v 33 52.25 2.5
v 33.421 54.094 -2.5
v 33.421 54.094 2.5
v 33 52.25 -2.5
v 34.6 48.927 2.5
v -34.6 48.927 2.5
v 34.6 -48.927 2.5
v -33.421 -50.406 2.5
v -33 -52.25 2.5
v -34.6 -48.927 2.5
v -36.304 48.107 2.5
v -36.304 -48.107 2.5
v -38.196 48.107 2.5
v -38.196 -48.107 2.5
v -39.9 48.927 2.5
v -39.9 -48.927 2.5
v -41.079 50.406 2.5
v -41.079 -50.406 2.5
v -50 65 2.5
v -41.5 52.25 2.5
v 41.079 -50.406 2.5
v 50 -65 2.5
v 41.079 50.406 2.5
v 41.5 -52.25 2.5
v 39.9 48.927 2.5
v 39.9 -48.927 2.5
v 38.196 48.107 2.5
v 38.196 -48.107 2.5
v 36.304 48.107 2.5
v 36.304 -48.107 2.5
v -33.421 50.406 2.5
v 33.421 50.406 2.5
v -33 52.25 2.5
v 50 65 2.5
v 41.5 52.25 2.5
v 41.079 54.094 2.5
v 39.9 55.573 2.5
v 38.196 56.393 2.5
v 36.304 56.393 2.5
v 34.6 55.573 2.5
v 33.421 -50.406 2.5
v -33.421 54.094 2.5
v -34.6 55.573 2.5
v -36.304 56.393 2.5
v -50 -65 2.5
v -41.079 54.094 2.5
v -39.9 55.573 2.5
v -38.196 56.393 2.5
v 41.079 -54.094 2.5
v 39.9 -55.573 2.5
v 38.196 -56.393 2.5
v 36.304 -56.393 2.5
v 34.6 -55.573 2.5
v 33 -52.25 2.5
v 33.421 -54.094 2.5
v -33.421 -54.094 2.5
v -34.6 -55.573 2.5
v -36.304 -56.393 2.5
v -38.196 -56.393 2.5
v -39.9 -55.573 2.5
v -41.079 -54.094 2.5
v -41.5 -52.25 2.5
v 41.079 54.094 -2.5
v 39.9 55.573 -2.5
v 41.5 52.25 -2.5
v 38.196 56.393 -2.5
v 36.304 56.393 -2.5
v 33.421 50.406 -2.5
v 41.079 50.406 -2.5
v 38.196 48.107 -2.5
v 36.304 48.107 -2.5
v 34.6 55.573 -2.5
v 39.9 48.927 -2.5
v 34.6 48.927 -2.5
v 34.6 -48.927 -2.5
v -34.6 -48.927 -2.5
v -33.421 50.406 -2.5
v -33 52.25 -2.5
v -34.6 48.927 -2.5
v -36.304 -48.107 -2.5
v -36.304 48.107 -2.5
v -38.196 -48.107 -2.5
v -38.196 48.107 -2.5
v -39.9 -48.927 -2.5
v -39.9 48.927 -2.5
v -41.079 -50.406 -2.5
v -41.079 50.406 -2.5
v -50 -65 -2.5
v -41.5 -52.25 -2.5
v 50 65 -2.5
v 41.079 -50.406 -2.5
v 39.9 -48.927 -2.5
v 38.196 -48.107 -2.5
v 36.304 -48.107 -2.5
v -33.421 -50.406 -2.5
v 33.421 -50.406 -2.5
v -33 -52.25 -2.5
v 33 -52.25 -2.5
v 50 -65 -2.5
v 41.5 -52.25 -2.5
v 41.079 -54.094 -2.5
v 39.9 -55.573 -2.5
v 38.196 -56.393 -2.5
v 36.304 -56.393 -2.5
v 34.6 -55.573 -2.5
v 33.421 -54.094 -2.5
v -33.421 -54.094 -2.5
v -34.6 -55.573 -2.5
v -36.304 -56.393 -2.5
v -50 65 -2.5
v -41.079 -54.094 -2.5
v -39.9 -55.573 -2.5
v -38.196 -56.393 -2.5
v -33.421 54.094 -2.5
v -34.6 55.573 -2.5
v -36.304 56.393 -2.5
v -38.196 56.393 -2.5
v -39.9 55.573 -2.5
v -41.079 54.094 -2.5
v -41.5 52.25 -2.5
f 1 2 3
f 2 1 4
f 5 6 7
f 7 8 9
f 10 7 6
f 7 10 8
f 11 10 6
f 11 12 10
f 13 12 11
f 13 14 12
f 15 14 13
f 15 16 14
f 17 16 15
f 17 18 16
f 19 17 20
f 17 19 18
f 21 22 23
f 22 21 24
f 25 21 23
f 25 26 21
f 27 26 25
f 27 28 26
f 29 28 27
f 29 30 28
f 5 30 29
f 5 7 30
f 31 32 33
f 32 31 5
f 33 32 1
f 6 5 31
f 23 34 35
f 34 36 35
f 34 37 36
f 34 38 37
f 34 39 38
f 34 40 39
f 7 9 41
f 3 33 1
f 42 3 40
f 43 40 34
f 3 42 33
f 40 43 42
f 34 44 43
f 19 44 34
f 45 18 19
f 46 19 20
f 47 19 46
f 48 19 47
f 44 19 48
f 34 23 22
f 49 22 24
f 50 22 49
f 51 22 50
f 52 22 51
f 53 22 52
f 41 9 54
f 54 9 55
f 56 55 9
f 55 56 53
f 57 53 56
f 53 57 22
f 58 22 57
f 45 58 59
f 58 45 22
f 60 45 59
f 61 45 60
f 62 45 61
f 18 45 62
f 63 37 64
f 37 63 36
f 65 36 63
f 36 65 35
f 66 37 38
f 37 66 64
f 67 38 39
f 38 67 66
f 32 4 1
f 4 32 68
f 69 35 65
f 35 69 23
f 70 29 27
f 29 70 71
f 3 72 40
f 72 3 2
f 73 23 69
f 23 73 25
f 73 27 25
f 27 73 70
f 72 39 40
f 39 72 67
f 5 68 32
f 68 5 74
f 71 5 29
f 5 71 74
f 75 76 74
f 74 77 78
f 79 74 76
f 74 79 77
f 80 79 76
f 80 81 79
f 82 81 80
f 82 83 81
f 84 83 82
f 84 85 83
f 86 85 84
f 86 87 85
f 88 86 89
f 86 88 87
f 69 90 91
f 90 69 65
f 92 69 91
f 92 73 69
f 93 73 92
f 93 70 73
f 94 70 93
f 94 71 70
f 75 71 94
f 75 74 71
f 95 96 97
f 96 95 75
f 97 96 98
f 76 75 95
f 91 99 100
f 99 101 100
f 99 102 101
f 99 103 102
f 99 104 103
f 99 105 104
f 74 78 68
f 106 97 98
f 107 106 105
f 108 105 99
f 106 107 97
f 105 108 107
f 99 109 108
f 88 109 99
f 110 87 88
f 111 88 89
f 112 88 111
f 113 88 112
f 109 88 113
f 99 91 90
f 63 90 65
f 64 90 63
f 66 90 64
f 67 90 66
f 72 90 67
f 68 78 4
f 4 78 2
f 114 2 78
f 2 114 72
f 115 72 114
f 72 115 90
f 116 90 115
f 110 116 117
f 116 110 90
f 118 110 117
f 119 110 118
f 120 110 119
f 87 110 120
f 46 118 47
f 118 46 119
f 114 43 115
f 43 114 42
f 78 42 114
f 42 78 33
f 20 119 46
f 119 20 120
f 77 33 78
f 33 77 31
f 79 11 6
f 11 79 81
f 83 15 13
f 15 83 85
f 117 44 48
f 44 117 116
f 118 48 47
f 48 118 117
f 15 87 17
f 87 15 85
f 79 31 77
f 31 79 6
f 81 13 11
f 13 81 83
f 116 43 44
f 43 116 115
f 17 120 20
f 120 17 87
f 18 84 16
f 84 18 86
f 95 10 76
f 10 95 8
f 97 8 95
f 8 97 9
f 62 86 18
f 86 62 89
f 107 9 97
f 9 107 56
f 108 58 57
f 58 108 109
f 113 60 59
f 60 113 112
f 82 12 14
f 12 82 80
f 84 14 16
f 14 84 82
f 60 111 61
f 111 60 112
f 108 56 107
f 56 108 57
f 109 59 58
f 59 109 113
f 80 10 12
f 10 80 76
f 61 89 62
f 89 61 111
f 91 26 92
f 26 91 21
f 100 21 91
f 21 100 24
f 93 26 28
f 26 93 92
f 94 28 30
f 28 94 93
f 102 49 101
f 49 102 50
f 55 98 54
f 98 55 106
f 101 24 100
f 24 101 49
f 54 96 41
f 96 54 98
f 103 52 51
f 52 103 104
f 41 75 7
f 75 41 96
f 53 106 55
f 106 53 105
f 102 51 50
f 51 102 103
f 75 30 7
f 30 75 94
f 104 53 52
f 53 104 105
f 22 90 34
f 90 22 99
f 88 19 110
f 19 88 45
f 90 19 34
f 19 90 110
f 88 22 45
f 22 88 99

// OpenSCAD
// Generated by SolidPython 1.1.3 on 2023-10-18 16:19:57


difference() {
	cube(center = true, size = [100, 130.0000000000, 5]);
	union() {
		translate(v = [37.2500000000, 52.2500000000]) {
			cylinder(center = true, h = 5, r = 4.2500000000);
		}
		translate(v = [-37.2500000000, 52.2500000000]) {
			cylinder(center = true, h = 5, r = 4.2500000000);
		}
		translate(v = [-37.2500000000, -52.2500000000]) {
			cylinder(center = true, h = 5, r = 4.2500000000);
		}
		translate(v = [37.2500000000, -52.2500000000]) {
			cylinder(center = true, h = 5, r = 4.2500000000);
		}
	}
}
/***********************************************
*********      SolidPython code:      **********
************************************************
 
import solid
import numbers
import pudb
from solid.utils import *
import viewscad
import subprocess
import os
import os.path as osp
import math
import sys

chamfer_extrude=solid.import_scad("./chamfer_extrude.scad")
chamfer_extrude=chamfer_extrude.chamfer_extrude
r = viewscad.Renderer(width=800, height=800)

def debug(model,f_name,path="/home/ts/code/projects/mfd/designs/debug"):
    solid.scad_render_to_file(model,osp.join(path,f_name)+".scad")
#generate position list of wells using offset from center
wells_pos_from_center_4 = lambda offset: [[-offset,offset],
                                        [offset, offset],
                                        [-offset, -offset],
                                        [offset, -offset]]
#wells_pos_from_center_2 = lambda offset: [[0,offset],
#                                        [0, -offset]]
wells_pos_from_center_2 = lambda offset: [[offset,0],
                                        [-offset,0]]

def make_well(dims,shape=None,height=None,dxf=False):
    def circle_cylinder():
        if dxf or (height is None):
            well = solid.circle(r=dims, segments=64)
        else:
            well = solid.cylinder(r=dims, h=height, segments=64, center = True)
        return well
    if dims is None:
        sys.exit("radius needs to be a number")
    if isinstance(dims, numbers.Number):
        well =circle_cylinder()
    elif len(dims)==1:
        if isinstance(dims[1], numbers.Number):
            well =circle_cylinder()
        else:
            sys.exit("radius needs to be a number")
    elif len(dims)==2:
        well = solid.square(dims,center = True)
    elif len(dims)==3:
        well = solid.cube(dims, center = True)
    return well

def wells_top_bottom(center_gap,device_dims=None,shape=None,height=None, positions = None, dxf = False,well_shape=None):
    if well_shape == None:
        well_shape = make_well(device_dims,shape=shape,height=height,dxf=dxf)
    wells = []
    if positions is None:
        offset = radius+radius/2.0
        positions = wells_pos_from_center_2(offset)
    if dxf or (height is None):
        height = 0
    for position in positions:
        if dxf:
            wells.append(solid.translate([position[0],position[1]])(well_shape))
        else:
            wells.append(solid.translate([position[0],position[1],height/2.0])(well_shape))
    return  union()(*wells)

#place wells in four corners 
def four_corner(radius,height=None, positions = None, dxf = False):
    #if well pos not specified set
    #to equally spaced by half radius
    if positions is None:
        offset = radius+radius/2.0
        positions = wells_pos_from_center_4(offset)
    if dxf or (height is None):
        height = 0
    #make wells at positions with specified radius and height
    wells = []
    for position in positions:
        #make circle if making dxf
        if dxf:
            well_shape = solid.circle(r=radius, segments=64)
            well_shape = solid.translate([position[0],position[1]])(well_shape)
        #if stl make cylinder
        else:
            well_shape = solid.cylinder(r=radius, h=height, segments=64, center = True)
            well_shape = solid.translate([position[0],position[1],height/2.0])(well_shape)
        wells.append(well_shape)
    return  union()(*wells)

#generate channels 
def make_channels(length,width,height=0,num_chans=1,max_chans=None,spacing=None, dxf = False,
                  rotate_channels=False):
    if dxf or (height is None):
        height = 0
    #if channel gap not defined, is equal to
    if spacing is None: spacing = width
    #calculate number of channels if fitting max num within given width
    if not max_chans is None:
        import math
        num_chans = math.floor((max_chans-spacing)/(width+spacing))
    #get total width of channel section  
    total_width = (width*num_chans)+(spacing*(num_chans-1))

    #make template channel
    #if rotate_channels: width, length = length, width
    if dxf:
        channel_t = solid.square([length,width],center = True)
    else:
        channel_t = solid.cube([length,width,height], center = True)

    #if number channels is even, offset the first channel to center its gap
    if num_chans % 2 == 0: centering = -(width/2.0+spacing/2.0)
    else: centering = 0
    #move template channel up to align bottom at z = 0 
    #and offset center if necessary
    if dxf:
        channel_t = solid.translate([0,centering])(channel_t)
    else:
        channel_t = solid.translate([0,centering,height/2.0])(channel_t)

    #if rotate_channels: length,width = width,length
    #start making the channels
    channels = []
    for i in range(num_chans):
        #if i=0 there is no translation
        #if i=1, we make the first channel adjacent to second
        direction = i

        #if i>=1, we add channels alternating left and right
        if i >= 1:
            direction = -(i/2.0)
            if i % 2 == 1: direction = (-direction)+0.5
                
        #make channel at right position and add it to channel list
        translation_coords = [0,direction*(width+spacing)]
        #if rotate_channels: translation_coords = [direction*(width+spacing),0]
        if dxf:
            channel = solid.translate(translation_coords)(channel_t)
        else:
            channel = solid.translate([*translation_coords,0])(channel_t)
        channels.append(channel)
    
    #group all channels as one object
    channels = union()(*channels)
    #compute the x,y,z dimensions in order to pass as arguments 
    #for construction of other parts of device (such as the chambers)
    measurements = {'x':(length/2.0,-length/2.0),
                    'y':(total_width/2.0,-total_width/2.0)}
    if not dxf:
        measurements['z'] = (height,0)
    if rotate_channels:
        channels = solid.rotate(90)(channels)
        measurements['x'],measurements['y']=measurements['y'],measurements['x']
    return channels,measurements

def make_chambers(msrs,height=None,extra=0,len_until=None,width=None, dxf = False):
    #computes x,y,z length
    total = lambda x : abs(x[0]) + abs(x[1])
    
    #if specific height if specified
    #otherwise use same height as channels
    if dxf:
        pass
    elif not height is None:
        msrs['z'] = (height,0)
    else:
        msrs['z'] = (0,0)
        
    #make copy of measurements from channels to modify chamber dimensions 
    #and add length to chambers as specified
    chamber_dims = msrs.copy()
    #calculate length of chamber to reach specified offset
    if not len_until is None:
        chamber_len = len_until-(msrs['x'][0])
    #or add specified length to channel length (if not specified, adds 0)
    else:
        chamber_len = msrs['x'][0]+extra
    #set the chamber length based 
    chamber_dims['x'] = (chamber_len/2.0,-(chamber_len/2.0))
    #compute final dimensions of chamber
    if not width is None:
        chamber_dims['y'] = (width/2.0,-width/2.0)
    chamber_dims = [total(size) for size in chamber_dims.values()]
        
    #calculate chamber translation offset to place adjacent to channels
    chamber_trslt = msrs['x'][0]+(chamber_len/2.0)
    #compute chamber translation coordinates to align with channels
    #x = 1 moves chamber above channels
    #x = -1 moves chamber below channels
    if dxf:
        trslt = lambda x : [x*(chamber_trslt),0]
    else:
        trslt = lambda x : [x*(chamber_trslt),0,msrs['z'][0]/2.0]
    
    #function to make chamber at top or at bottom 
    if dxf:
        move = lambda x : solid.translate(trslt(x))(solid.square(chamber_dims, center = True) )
    else:
        move = lambda x : solid.translate(trslt(x))(solid.cube(chamber_dims,center = True))
    #make top and bottom chambers and return them as grouped
    top = move(1)
    bottom = move(-1)
    #chambers=solid.rotate(90)(solid.union()(top,bottom))
    chambers=(solid.union()(top,bottom))

    return chambers

#create alignment features 
def alignment_features(unit,dims,grid_size, mask_size = None, alignment = "hollow", units_from_center = (2.5,2.5), corner_len=None):
    width = grid_size[0]*dims[0]
    length = grid_size[1]*dims[1]
    if mask_size is None and corner_len is None:
        corner_len = (dims[0] + dims[1]) /2 / 8
    corner = lambda thickness_div : solid.union()( solid.square([corner_len,corner_len/thickness_div],center=False), solid.square([corner_len/thickness_div,corner_len],center=False) )
    
    def make_full(thickness_div):
        thickness = corner_len/thickness_div
        tr = solid.translate([0, 0, 0 ])(solid.rotate(180)(corner(thickness_div)))
        tr = solid.translate([thickness/2,thickness/2,0])(tr)
        bl = solid.translate([0, 0, 0 ])(solid.rotate(0)(corner(thickness_div)))
        bl = solid.translate([-thickness/2,-thickness/2,0])(bl)
        return solid.union()(tr,bl)
    
    def make_hollow(thickness_div):
        thickness = corner_len/(thickness_div/2)
        inner = make_full(thickness_div)
        outer = make_full(thickness_div/2)
        hollow = outer - inner 
        return hollow
    
    center = (width /2 , length/2)
    mask_pos = lambda x,y : (center[0] + x*(float(units_from_center[0])*dims[0]), center[1] + y*(float(units_from_center[1])*dims[1]))
    positions = []
    positions.append(mask_pos(1,0))
    positions.append(mask_pos(0,1))
    positions.append(mask_pos(-1,0))
    positions.append(mask_pos(0,-1))
    make_mask = lambda mtype : make_hollow(8) if mtype == "hollow" else make_full(8)
    masks = [ solid.translate([*position,0])(make_mask(alignment)) for position in positions]
    
    solid.scad_render_to_file(solid.union()(*masks),"./designs/open_chamber/masks.scad")
    #return unit - solid.union()(*masks)
    return solid.union()(*masks,unit)

def create_outline(thickness, array, dims, grid_size,):
    width = grid_size[0]*dims[0] + thickness *2
    length = grid_size[1]*dims[1] + thickness *2
    outer = solid.translate([-thickness, -thickness,0])(solid.square([width, length]))
    return outer-array

def create_wall(wall_thickness, outline_thickness, dims, grid_size, wall_height = 2000, dxf = False):
    inner_width = grid_size[0]*dims[0] + outline_thickness *2
    inner_length = grid_size[1]*dims[1] + outline_thickness *2
    outer_width = inner_width + wall_thickness * 2
    outer_length = inner_length + wall_thickness * 2
    outer_pos_x = -outline_thickness-wall_thickness
    outer_pos_y = -outline_thickness-wall_thickness
    inner_pos_x = -outline_thickness
    inner_pos_y = -outline_thickness
    if dxf:
        inner_wall = solid.translate([inner_pos_x,
                                      inner_pos_y,
                                      0])(solid.square([inner_width, inner_length]))
        outer_wall = solid.translate([outer_pos_x,
                                      outer_pos_y,
                                      0])(solid.square([outer_width, outer_length]))

        return outer_wall-inner_wall
    else:
        inner_wall = solid.translate([inner_pos_x,
                                      inner_pos_y,
                                      0])(solid.cube([inner_width, inner_length,wall_height]))
        outer_wall = solid.translate([outer_pos_x,
                                      outer_pos_y,
                                      0])(solid.cube([outer_width, outer_length,wall_height]))

        return outer_wall-inner_wall, {'wall_height': wall_height,
                                       'wall_thickness': wall_thickness,
                                       'inner_width':inner_width,
                                       'inner_length': inner_length,
                                       'outer_width': outer_width,
                                       'outer_length': outer_length,
                                       'outer_pos_x' : outer_pos_x,
                                       'outer_pos_y' : outer_pos_y,
                                       'inner_pos_x' : inner_pos_x,
                                       'inner_pos_y' : inner_pos_y}

def create_thicker_wall(wall_thickness, outer_wall_offset, wall_dims, dims, grid_size, height_start = .2, height_end=2, dxf = False):
    addon_wall,thicker_wall_dims = create_wall(wall_thickness, outer_wall_offset, dims, grid_size, wall_height=height_end-height_start, dxf = False)
    addon_wall = solid.translate([0,0,height_start])(addon_wall)

    thicker_wall_dims['wall_height'] = height_end
    thicker_wall_dims['wall_thickness'] = wall_dims['wall_thickness'] + wall_thickness
    return addon_wall, thicker_wall_dims
 
def add_lock_to_wall(wall,wall_dims,y_offset = 0,cut_ratio=0.7,L_length=3, gap_ratio=0.05, axis="x",width_ratio=1/2):
    # Makes L shape
    def make_L(max_length,length_thickness,max_width,width_thickness,height,y_offset):
        length = solid.cube([max_length,length_thickness,height])
        width = solid.cube([width_thickness,max_width,height])
        width = solid.translate([max_length-(width_thickness),0,0])(width)
        L = solid.union()(width,length)
        debug(L,"L")
        if axis == "x":
            L = solid.rotate(-90)(L)
            L = solid.translate([0,max_length,0])(L)
        else:
            L = solid.rotate(-180)(L)
            L = solid.translate([max_length,max_width,0])(L)
        return solid.translate([0,0,y_offset])(L)
    
    lock_length = L_length
    lock_width = wall_dims['wall_thickness']*width_ratio
    lock_length_thickness = lock_width/2
    lock_width_thickness = lock_width/2
    L_lock = make_L(lock_length,lock_length_thickness,lock_width,lock_width_thickness, wall_dims['wall_height']-y_offset, y_offset)
    
    margin_space = lock_length - lock_length*(1-gap_ratio)
    key_length = lock_length-margin_space
    key_length_thickness = lock_length_thickness-(margin_space*2)
    key_width = lock_width-(margin_space*2)
    key_width_thickness = lock_width_thickness-(margin_space*2)
    L_key = make_L(key_length,key_length_thickness,key_width,key_width_thickness, wall_dims['wall_height']-y_offset, y_offset)
    L_key = solid.translate([margin_space,margin_space,0])(L_key)
    L = solid.union()(L_lock,L_key)
    debug(L,"L")
    
    #Make cube to be used as negative to split frame in a half
    #Can choose if making left or right negative, specify ratio of split
    def make_negative(right,cut_ratio):
        if axis == "x":
            if right:
                length = wall_dims['outer_length']*(1-cut_ratio)
                pos_x = wall_dims['outer_pos_x']+(wall_dims['outer_length']*cut_ratio)
            else:
                length = wall_dims['outer_length']*(cut_ratio)
                pos_x = wall_dims['outer_pos_x'] 
            negative = solid.cube([wall_dims['outer_width'],length, wall_dims['wall_height']])
            negative = solid.translate([wall_dims['outer_pos_y'],pos_x,0])(negative)
        else:
            if right:
                length = wall_dims['outer_width']*(1-cut_ratio)
                pos_x = wall_dims['outer_pos_y']+(wall_dims['outer_width']*cut_ratio)
            else:
                length = wall_dims['outer_width']*(cut_ratio)
                pos_x = wall_dims['outer_pos_y'] 
            negative = solid.cube([length,wall_dims['outer_length'], wall_dims['wall_height']])
            negative = solid.translate([pos_x,wall_dims['outer_pos_x'],0])(negative)
        return negative, pos_x, length 
                      
    #Make negatives
    negative_right, right_half_pos_x, right_half_length = make_negative(True,cut_ratio)
    negative_left, left_half_pos_x, right_half_length = make_negative(False,cut_ratio)
    #Make halves
    left_half = solid.difference()(wall,negative_right)
    right_half = solid.difference()(wall,negative_left)
    def place_L(L, L_length,L_width):
        #Place L on top wall       
        offset_to_center = (wall_dims['wall_thickness']-L_width)/2
        if axis == "x":
            y_pos_top = (wall_dims['outer_pos_y'] +
                    wall_dims['outer_width'] - 
                    L_width - offset_to_center)
            top_L = solid.translate([y_pos_top,
                                     right_half_pos_x-(L_length),
                                     0])(L)
            #Place L on bottom wall       
            y_pos_bottom = wall_dims['outer_pos_y']+offset_to_center
            bottom_L = solid.translate([y_pos_bottom,
                                        right_half_pos_x-L_length,
                                        0])(L)
        else:
            y_pos_top = (wall_dims['outer_pos_x'] +
                    wall_dims['outer_length'] -
                    (L_width+offset_to_center))
            top_L = solid.translate([right_half_pos_x-L_length,
                                     y_pos_top,
                                     0])(L)
            #Place L on bottom wall       
            y_pos_bottom = wall_dims['outer_pos_y']+offset_to_center
            bottom_L = solid.translate([right_half_pos_x-L_length,
                                        y_pos_bottom,
                                        0])(L)
        return bottom_L, top_L
    #Make complimentary L pieces through union and differences
    #Make Lock
    bottom_L_lock, top_L_lock = place_L(L_lock,L_length,lock_width)
    left_half = solid.difference()(left_half,bottom_L_lock)
    left_half = solid.difference()(left_half,top_L_lock)
    #Make Key
    bottom_L_key, top_L_key = place_L(L_key,L_length,lock_width)
    right_half = solid.union()(right_half,bottom_L_key)
    right_half = solid.union()(right_half,top_L_key)
    return left_half, right_half


#build a row x col grid of containment units
def make_unit_array(unit,dims,grid_size, dxf = False, alignment = None, mask_size = None,
                    units_from_center = None,alignment_offset=None, alignment_mark_size=1):
    units = []
    for col in range(grid_size[1]):
        for row in range(grid_size[0]):
            if dxf:
                units.append(solid.translate([row*dims[0],col*dims[1]])(unit))
            else:
                units.append(solid.translate([row*dims[0],col*dims[1],dims[2]/2.0])(unit))
    array = solid.union()(*units)
    if (not alignment is None) and dxf:
        if not alignment_offset is None:
            array = solid.translate([alignment_offset[0],alignment_offset[1]])(array)
        array = alignment_features(array,dims, grid_size, alignment = alignment, mask_size = None, units_from_center = units_from_center,corner_len=alignment_mark_size)
        if not alignment_offset is None:
            array = solid.translate([-alignment_offset[0],-alignment_offset[1]])(array)
    return array


def make_taylor(wells_pos = wells_pos_from_center_4(2.25), well_rad = 1.5 ,
                well_height = 2, chan_w = 0.01, chan_l = 1, chan_h = 0.010 ,
                chan_gap = 0.040, max_chans = None,num_chans=100, chamber_height  = 0.100,
                columns = 1, rows = 1, chamber_len_until=2.25, add_channels = True, add_wells = True, 
                add_chambers = True, save_path = "./", alignment = None, units_from_center = 2,
                mask_size = None, render_stl = False, outline_thickness = 0.050, dxf = True,
                wall_height = 15, wall_thickness = 0.95, casing_x=9, casing_y=9, casing_z=0,rotate_units=0):

    dims = [casing_x, casing_y, casing_z]
    wells = four_corner(well_rad,well_height, dxf = dxf, positions = wells_pos)
    debug(wells,"wells")
    channels, msrs = make_channels(chan_l,chan_w,chan_h,dxf=dxf, spacing = chan_gap, max_chans=max_chans,num_chans=num_chans)
    debug(channels,"channels")
    chambers = make_chambers(msrs,dxf = dxf, height=chamber_height,len_until=chamber_len_until)
    debug(chambers,"chambers")

    #add together and render
    device_parts = []
    if add_channels:
        device_parts.append(channels)
    if add_wells:
        device_parts.append(wells)
    if add_chambers:
        device_parts.append(chambers)
    device=union()(*device_parts)
    device = rotate(rotate_units)(device)

    device=solid.translate([dims[0]/2.0,dims[1]/2.0,0])(device)
    channels = rotate(rotate_units)(channels)
    channels=solid.translate([dims[0]/2,dims[1]/2,0])(channels)
    chambers_wells = union()(wells,chambers)
    chambers_wells = rotate(rotate_units)(chambers_wells)
    chambers_wells=solid.translate([dims[0]/2,dims[1]/2,0])(chambers_wells)

    file_name = str(rows)+'x'+str(columns)+'_units_'
    grid_size = [rows,columns]

    if alignment:
        alignment="full"
    device = make_unit_array(device,dims,grid_size, dxf=dxf, alignment = alignment,
                                 units_from_center = units_from_center)
    channels = make_unit_array(channels,dims,grid_size, dxf=dxf, alignment = alignment,
                                 units_from_center = units_from_center)
    if alignment=="full":
        alignment="hollow"

    chambers_wells = make_unit_array(chambers_wells,dims,grid_size, dxf=dxf, alignment = alignment,
                                 units_from_center =units_from_center)

    def save_model(model,prefix):
        model_fname = os.path.abspath(save_path+prefix+"_"+file_name+".scad")
        solid.scad_render_to_file(model,model_fname)
        return model_fname

    wells_fname = save_model(wells,"wells")
    channels_fname = save_model(channels,"channels")
    device_fname = save_model(device,"device")
    chambers_wells_fname = save_model(chambers_wells,"chambers_wells")
    return (chambers_wells,chambers_wells_fname), (channels,channels_fname), (device,device_fname)

def make_device(design='open',rows=8,columns=6,wells_pos = 4.5,well_offset=3.2, well_rad=3.2,well_height=0.1,
                chan_l=1,chan_w=0.01,chan_h=0.01,chan_gap=0.015,num_chans=101,dxf=True,save_path="./designs/open_chamber/",
                casing_x=9.0,casing_y=18.0,casing_z=0,rotate_units=90,units_from_center=(3,1),chamber_len_until=4.5,
                chamber_width=None,alignment=True, add_wells=True, add_channels=True,add_chambers=True,well_shape=None):

    dims = [casing_x, casing_y, casing_z]
    if design == "open":
        wells_pos=wells_pos_from_center_2(wells_pos)
        wells = wells_top_bottom(well_offset*2,device_dims=well_rad,height=well_height, dxf = dxf, positions = wells_pos,well_shape=well_shape)
    elif design == "closed":
        wells_pos=wells_pos_from_center_4(wells_pos)
        debug(wells,"wells")
        wells = four_corner(well_offset,well_height,device_dims=well_rad, dxf = dxf, positions = wells_pos)
    else:
        print(design+" is not a valid design.\n Choose valid design: 'open' or 'closed'")
        exit()
    wells = rotate(rotate_units)(wells)
    wells=solid.translate([dims[0]/2,dims[1]/2,0])(wells)
    debug(wells,"wells")

    channels, msrs = make_channels(chan_l,chan_w,chan_h,dxf=dxf, spacing = chan_gap, num_chans=num_chans,rotate_channels=False)
    channels = rotate(rotate_units)(channels)
    channels=solid.translate([dims[0]/2,dims[1]/2,0])(channels)

    chambers=make_chambers(msrs,height=None,extra=0,len_until=chamber_len_until, width=chamber_width,dxf = dxf)
    chambers = rotate(rotate_units)(chambers)
    chambers=solid.translate([dims[0]/2,dims[1]/2,0])(chambers)

    device_parts = []
    if add_channels:
        device_parts.append(channels)
    if add_wells:
        device_parts.append(wells)
    if add_chambers:
        device_parts.append(chambers)
    device = union()(*device_parts)
    #device = rotate(rotate_units)(device)
    #device=solid.translate([dims[0]/2.0,dims[1]/2.0,0])(device)

    chambers_wells = []
    if add_chambers:
        chambers_wells.append(chambers)
    if add_wells:
        chambers_wells.append(wells)
    chambers_wells = union()(*chambers_wells)
    #chambers_wells = union()(wells,chambers)
    #chambers_wells = rotate(rotate_units)(chambers_wells)
    #chambers_wells=solid.translate([dims[0]/2,dims[1]/2,0])(chambers_wells)

    file_name = str(rows)+'x'+str(columns)+'_units_'

    grid_size = [rows,columns]
    if alignment:
        alignment="full"
    device = make_unit_array(device,dims,grid_size, dxf=dxf, alignment = alignment,
                                 units_from_center = units_from_center)
    channels = make_unit_array(channels,dims,grid_size, dxf=dxf, alignment = alignment,
                                 units_from_center = units_from_center)
    if alignment=="full":
        alignment="hollow"

    chambers_wells = make_unit_array(chambers_wells,dims,grid_size, dxf=dxf, alignment = alignment,
                                 units_from_center =units_from_center)

    def save_model(model,prefix):
        model_fname = os.path.abspath(save_path+prefix+"_"+file_name+".scad")
        solid.scad_render_to_file(model,model_fname)
        return model_fname

    wells_fname = save_model(wells,"wells")
    channels_fname = save_model(channels,"channels")
    device_fname = save_model(device,"device")
    chambers_wells_fname = save_model(chambers_wells,"chambers_wells")
    return (chambers_wells,chambers_wells_fname), (channels,channels_fname), (device,device_fname)


def make_open_chamber(rows=8,columns=6,wells_pos = wells_pos_from_center_2(4.5), well_rad=3.2,well_height=0.1,
                      chan_l=1,chan_w=0.01,chan_h=0.01,chan_gap=0.015,num_chans=101,dxf=True,save_path="./designs/open_chamber/",
                      casing_x=9.0,casing_y=18.0,casing_z=0,rotate_units=90,units_from_center=(3,1),chamber_len_until=4.5,
                      chamber_width=None,alignment=True, add_wells=True, add_channels=True,add_chambers=True,well_shape=None):

    dims = [casing_x, casing_y, casing_z]
    wells = wells_top_bottom(well_rad,height=well_height, dxf = dxf, positions = wells_pos, well_shape=well_shape)
    channels, msrs = make_channels(chan_l,chan_w,chan_h,dxf=dxf, spacing = chan_gap, num_chans=num_chans,rotate_channels=False)
    chambers=make_chambers(msrs,height=None,extra=0,len_until=chamber_len_until, width=chamber_width,dxf = dxf)
    debug(chambers,"chambers")
    device_parts = []
    if add_channels:
        device_parts.append(channels)
    if add_wells:
        device_parts.append(wells)
    if add_chambers:
        device_parts.append(chambers)
    device = union()(*device_parts)
    device = rotate(rotate_units)(device)
    device=solid.translate([dims[0]/2.0,dims[1]/2.0,0])(device)
    channels = rotate(rotate_units)(channels)
    channels=solid.translate([dims[0]/2,dims[1]/2,0])(channels)
    chambers_wells = union()(wells,chambers)
    chambers_wells = rotate(rotate_units)(chambers_wells)
    chambers_wells=solid.translate([dims[0]/2,dims[1]/2,0])(chambers_wells)

    file_name = str(rows)+'x'+str(columns)+'_units_'

    grid_size = [rows,columns]
    if alignment:
        alignment="full"
    device = make_unit_array(device,dims,grid_size, dxf=dxf, alignment = alignment,
                                 units_from_center = units_from_center)
    channels = make_unit_array(channels,dims,grid_size, dxf=dxf, alignment = alignment,
                                 units_from_center = units_from_center)
    if alignment=="full":
        alignment="hollow"

    chambers_wells = make_unit_array(chambers_wells,dims,grid_size, dxf=dxf, alignment = alignment,
                                 units_from_center =units_from_center)

    def save_model(model,prefix):
        model_fname = os.path.abspath(save_path+prefix+"_"+file_name+".scad")
        solid.scad_render_to_file(model,model_fname)
        return model_fname

    wells_fname = save_model(wells,"wells")
    channels_fname = save_model(channels,"channels")
    device_fname = save_model(device,"device")
    chambers_wells_fname = save_model(chambers_wells,"chambers_wells")
    return (chambers_wells,chambers_wells_fname), (channels,channels_fname), (device,device_fname)

def to_dxf(scad_path):
    dxf_path = scad_path.replace(".scad",".dxf")
    subprocess.call(["openscad", "-o", dxf_path, scad_path])
    import ezdxf
    temp_dxf = ezdxf.readfile(dxf_path)
    temp_dxf.saveas(dxf_path)

#def make_walls(diameter,thickness,grid_size,dims,height=20,segments=256,make_inner=True):
#    wafer_wall_out = solid.cylinder(r=diameter/2,h=height, segments=segments)
#    wafer_wall_in = solid.cylinder(r=(diameter/2-thickness),h=height, segments=segments)
#    wafer_wall = solid.difference()(wafer_wall_out,wafer_wall_in)
#    wafer_wall = solid.translate([grid_size[1]*dims[1]/2.0,grid_size[0]*dims[0]/2.0])(wafer_wall)
#
#    vertical_wall_length = grid_size[1]*dims[1]
#    horizontal_wall_length = grid_size[0]*dims[0]
#    vertical_wall = solid.cube([vertical_wall_length,thickness,height],center = True)
#    vertical_wall = solid.translate([vertical_wall_length/2,0,height/2])(vertical_wall)
#    horizontal_wall = solid.cube([thickness,horizontal_wall_length,height],center = True)
#    horizontal_wall = solid.translate([0,vertical_wall_length/2,height/2])(horizontal_wall)
#    walls = []
#    walls.append(horizontal_wall)
#    walls.append(vertical_wall)
#    for col in range(grid_size[1]):
#        if col == grid_size[1]-1: 
#            walls.append(solid.translate([0,(col+1)*dims[1]])(vertical_wall))
#        elif col > 0 and col < grid_size[1]-1 and make_inner==True:
#            walls.append(solid.translate([0,(col+1)*dims[1]])(vertical_wall))
#    for row in range(grid_size[0]):
#        if row == grid_size[0]-1: 
#            walls.append(solid.translate([(row+1)*dims[0],0])(horizontal_wall))
#        elif row > 0 and row < grid_size[0]-1 and make_inner==True:
#            walls.append(solid.translate([(row+1)*dims[0],0])(horizontal_wall))
#    walls = union()(*walls)
#    wafer_walls = union()(walls,wafer_wall)
#    return walls,wafer_wall,wafer_walls

def make_walls(diameter,thickness,grid_size,dims,height=20,segments=256,make_inner=True,padx=0,pady=0):
    wafer_wall_out = solid.cylinder(r=diameter/2,h=height, segments=segments)
    wafer_wall_in = solid.cylinder(r=(diameter/2-thickness),h=height, segments=segments)
    wafer_wall = solid.difference()(wafer_wall_out,wafer_wall_in)
    wafer_wall = solid.translate([grid_size[1]*dims[1]/2.0,grid_size[0]*dims[0]/2.0])(wafer_wall)

    vertical_wall_length = grid_size[0]*dims[0]+padx
    horizontal_wall_length = grid_size[1]*dims[1]+pady
    vertical_wall = solid.cube([vertical_wall_length,thickness,height],center = True)
    vertical_wall = solid.translate([vertical_wall_length/2-pady/2,-padx/2,height/2])(vertical_wall)
    horizontal_wall = solid.cube([thickness,horizontal_wall_length,height],center = True)
    horizontal_wall = solid.translate([-pady/2,horizontal_wall_length/2-padx/2,height/2])(horizontal_wall)
    walls = []
    walls.append(horizontal_wall)
    walls.append(vertical_wall)
    for col in range(grid_size[1]):
        if col == grid_size[1]-1: 
            walls.append(solid.translate([0,(col+1)*dims[1]+pady])(vertical_wall))
        elif col > 0 and col < grid_size[1]-1 and make_inner==True:
            walls.append(solid.translate([0,(col+1)*dims[1]])(vertical_wall))
    for row in range(grid_size[0]):
        if row == grid_size[0]-1: 
            walls.append(solid.translate([(row+1)*dims[0]+padx,0])(horizontal_wall))
        elif row > 0 and row < grid_size[0]-1 and make_inner==True:
            walls.append(solid.translate([(row+1)*dims[0],0])(horizontal_wall))
    walls = union()(*walls)
    wafer_walls = union()(walls,wafer_wall)
    return walls,wafer_wall,wafer_walls

def save_model(model,base_path,base_name,dxf=True):
    if not os.path.exists(base_path):
        os.makedirs(base_path)
    dxf_path=osp.join(base_path,base_name+".scad")
    solid.scad_render_to_file(model,osp.join(dxf_path))
    if dxf:
        to_dxf(dxf_path)

def make_wafer(diameter,flat_len,thickness):
    wafer = solid.cylinder(r1=diameter/2,r2=diameter/2,h=thickness,segments=512,)()
    x_start_flat=(flat_len/2)
    y_start_flat = math.sqrt(((diameter/2)**2) - (x_start_flat**2) )
    height_delete_flat=diameter/2-y_start_flat
    flat_delete = solid.cube([flat_len,height_delete_flat,thickness],center=False)()
    flat_delete = solid.translate([-flat_len/2,y_start_flat,0])(flat_delete)
    wafer = solid.difference()(wafer,flat_delete)
    wafer = solid.rotate(90)(wafer)
    return wafer

def add_wafer_to_mask(wafer_size,flat_len,mask,grid_size,dims,wafer_line_thickness=0.1,outer_mask_thickness=5,alignment_offset=None):
    def make_wafer_mask(wafer_size,flat_len):
        wafer_mask = make_wafer(wafer_size,flat_len,1)
        wafer_mask = solid.projection()(wafer_mask)
        wafer_mask = solid.translate([grid_size[0]*dims[0]/2.0,grid_size[1]*dims[1]/2.0])(wafer_mask)
        if not alignment_offset is None:
            wafer_mask = solid.translate([-alignment_offset[0],-alignment_offset[1]])(wafer_mask)
        return wafer_mask

    inner_wafer_line_mask = make_wafer_mask(wafer_size-wafer_line_thickness/2,flat_len)
    outer_wafer_line_mask = make_wafer_mask(wafer_size+wafer_line_thickness/2,flat_len)
    outer_wafer_mask = make_wafer_mask(wafer_size+outer_mask_thickness,flat_len)
    outer_wafer_mask = solid.difference()(outer_wafer_mask,outer_wafer_line_mask)
    wafer_mask = solid.union()(outer_wafer_mask,inner_wafer_line_mask)

    return solid.difference()(wafer_mask,mask)

def make_posts(post_shape,post_height):
    posts = solid.linear_extrude(height=post_height)(post_shape)
    return posts

def make_wafer_empty(diameter,flat_len,thickness,margin,notch_len=20,notch_height=5,oversize=1.01):
    diameter*=oversize
    flat_len*=oversize
    wafer = make_wafer(diameter,flat_len,thickness)
    holder = solid.cylinder(r1=diameter/2+margin,r2=diameter/2+margin,h=thickness,segments=512)()
    holder = solid.difference()(holder,wafer)

    x_start_flat=(flat_len/2)
    y_start_flat = math.sqrt(((diameter/2)**2) - (x_start_flat**2) )
    height_delete_flat=diameter/2-y_start_flat
    notch = solid.cube([notch_len,notch_height,thickness],center=False)()
    notch = solid.translate([-notch_len/2,y_start_flat,0])(notch)
    notch = solid.rotate(90)(notch)
    return solid.difference()(holder,notch)

def wafer_print_calibration(diameter,thickness,height,z_offset):
    circles = []
    radii = []
    radii.append(diameter/2.0*0.8)
    radii.append(diameter/2.0*0.6)
    radii.append(diameter/2.0*0.4)
    radii.append(diameter/2.0*0.2)
    for radius in radii:
        inner = solid.cylinder(r1=radius-(thickness/2.0),r2=radius-(thickness/2.0),h=thickness,segments=512,)()
        outer = solid.cylinder(r1=radius+(thickness/2.0),r2=radius+(thickness/2.0),h=thickness,segments=512,)()
        diff = solid.difference()(outer,inner)
        circles.append(diff)
    circles = solid.union()(*circles)
    circles = solid.translate([0,0,z_offset])(circles)
    return circles

def make_rack(wells,dims,grid_size,alignment_offset,rack_x,rack_y,rack_thickness,bolt_width,add_bolts=True):

    #get X and Y dimensions of gride of pipette tips
    X_len = dims[0]*grid_size[0]
    Y_len = dims[1]*grid_size[1]
    #make rack
    rack = solid.cube([rack_x,rack_y,rack_thickness],center=True)

    if add_bolts:
    #add bolt holes
        bolt_hole=solid.cylinder(r=bolt_width/2,h=rack_thickness,center=True)()
        bolt_holes = []
        bolt_holes.append(solid.translate([rack_x/2-1.5*bolt_width,rack_y/2-1.5*bolt_width])(bolt_hole))
        bolt_holes.append(solid.translate([-rack_x/2+1.5*bolt_width,rack_y/2-1.5*bolt_width])(bolt_hole))
        bolt_holes.append(solid.translate([-rack_x/2+1.5*bolt_width,-rack_y/2+1.5*bolt_width])(bolt_hole))
        bolt_holes.append(solid.translate([rack_x/2-1.5*bolt_width,-rack_y/2+1.5*bolt_width])(bolt_hole))
        bolt_holes = solid.union()(*bolt_holes)
        rack=solid.difference()(rack,bolt_holes)
    rack_support = rack

    #center rack with pipette holes
    rack = solid.translate([0,0,rack_thickness/2])(rack)
    rack = solid.translate([X_len/2,Y_len/2])(rack)
    rack = solid.translate([-alignment_offset[0],-alignment_offset[1]])(rack)
    wells = solid.linear_extrude(height=rack_thickness)(wells)
    rack = solid.difference()(rack,wells)
    return rack, rack_support

def make_pillar(wells,dims,grid_size,alignment_offset,rack_x,rack_y,pillar_height,rack_thickness,bolt_width,add_bolts=True,taper_angle=1,bolt_position_corner=1.5):

    #get X and Y dimensions of gride of pipette tips
    X_len = dims[0]*grid_size[0]
    Y_len = dims[1]*grid_size[1]
    #make rack
    rack = solid.cube([rack_x,rack_y,rack_thickness],center=True)
    
    if add_bolts:
    #add bolt holes
        bolt_hole=solid.cylinder(r=bolt_width/2,h=rack_thickness,center=True)()
        bolt_holes = []
        bolt_holes.append(solid.translate([rack_x/2-bolt_position_corner*bolt_width,rack_y/2-bolt_position_corner*bolt_width])(bolt_hole))
        bolt_holes.append(solid.translate([-rack_x/2+bolt_position_corner*bolt_width,rack_y/2-bolt_position_corner*bolt_width])(bolt_hole))
        bolt_holes.append(solid.translate([-rack_x/2+bolt_position_corner*bolt_width,-rack_y/2+bolt_position_corner*bolt_width])(bolt_hole))
        bolt_holes.append(solid.translate([rack_x/2-bolt_position_corner*bolt_width,-rack_y/2+bolt_position_corner*bolt_width])(bolt_hole))
        bolt_holes = solid.union()(*bolt_holes)
        rack=solid.difference()(rack,bolt_holes)
    rack_support = rack

    #center rack with pipette holes
    #rack = solid.translate([0,0,-rack_thickness])(rack)
    rack = solid.translate([X_len/2,Y_len/2])(rack)
    rack = solid.translate([-alignment_offset[0],-alignment_offset[1]])(rack)
    if not taper_angle == 0:
        wells=chamfer_extrude(pillar_height,taper_angle,segments=20)(wells)
    else:
        wells = solid.linear_extrude(height=pillar_height)(wells)
    rack = solid.union()(rack,wells)
    return rack, rack_support

def deg_taper_len(height,deg):
    if not deg == 0:
        return height*math.tan(math.radians(deg))
    else:
        return 0









 
 
************************************************/
